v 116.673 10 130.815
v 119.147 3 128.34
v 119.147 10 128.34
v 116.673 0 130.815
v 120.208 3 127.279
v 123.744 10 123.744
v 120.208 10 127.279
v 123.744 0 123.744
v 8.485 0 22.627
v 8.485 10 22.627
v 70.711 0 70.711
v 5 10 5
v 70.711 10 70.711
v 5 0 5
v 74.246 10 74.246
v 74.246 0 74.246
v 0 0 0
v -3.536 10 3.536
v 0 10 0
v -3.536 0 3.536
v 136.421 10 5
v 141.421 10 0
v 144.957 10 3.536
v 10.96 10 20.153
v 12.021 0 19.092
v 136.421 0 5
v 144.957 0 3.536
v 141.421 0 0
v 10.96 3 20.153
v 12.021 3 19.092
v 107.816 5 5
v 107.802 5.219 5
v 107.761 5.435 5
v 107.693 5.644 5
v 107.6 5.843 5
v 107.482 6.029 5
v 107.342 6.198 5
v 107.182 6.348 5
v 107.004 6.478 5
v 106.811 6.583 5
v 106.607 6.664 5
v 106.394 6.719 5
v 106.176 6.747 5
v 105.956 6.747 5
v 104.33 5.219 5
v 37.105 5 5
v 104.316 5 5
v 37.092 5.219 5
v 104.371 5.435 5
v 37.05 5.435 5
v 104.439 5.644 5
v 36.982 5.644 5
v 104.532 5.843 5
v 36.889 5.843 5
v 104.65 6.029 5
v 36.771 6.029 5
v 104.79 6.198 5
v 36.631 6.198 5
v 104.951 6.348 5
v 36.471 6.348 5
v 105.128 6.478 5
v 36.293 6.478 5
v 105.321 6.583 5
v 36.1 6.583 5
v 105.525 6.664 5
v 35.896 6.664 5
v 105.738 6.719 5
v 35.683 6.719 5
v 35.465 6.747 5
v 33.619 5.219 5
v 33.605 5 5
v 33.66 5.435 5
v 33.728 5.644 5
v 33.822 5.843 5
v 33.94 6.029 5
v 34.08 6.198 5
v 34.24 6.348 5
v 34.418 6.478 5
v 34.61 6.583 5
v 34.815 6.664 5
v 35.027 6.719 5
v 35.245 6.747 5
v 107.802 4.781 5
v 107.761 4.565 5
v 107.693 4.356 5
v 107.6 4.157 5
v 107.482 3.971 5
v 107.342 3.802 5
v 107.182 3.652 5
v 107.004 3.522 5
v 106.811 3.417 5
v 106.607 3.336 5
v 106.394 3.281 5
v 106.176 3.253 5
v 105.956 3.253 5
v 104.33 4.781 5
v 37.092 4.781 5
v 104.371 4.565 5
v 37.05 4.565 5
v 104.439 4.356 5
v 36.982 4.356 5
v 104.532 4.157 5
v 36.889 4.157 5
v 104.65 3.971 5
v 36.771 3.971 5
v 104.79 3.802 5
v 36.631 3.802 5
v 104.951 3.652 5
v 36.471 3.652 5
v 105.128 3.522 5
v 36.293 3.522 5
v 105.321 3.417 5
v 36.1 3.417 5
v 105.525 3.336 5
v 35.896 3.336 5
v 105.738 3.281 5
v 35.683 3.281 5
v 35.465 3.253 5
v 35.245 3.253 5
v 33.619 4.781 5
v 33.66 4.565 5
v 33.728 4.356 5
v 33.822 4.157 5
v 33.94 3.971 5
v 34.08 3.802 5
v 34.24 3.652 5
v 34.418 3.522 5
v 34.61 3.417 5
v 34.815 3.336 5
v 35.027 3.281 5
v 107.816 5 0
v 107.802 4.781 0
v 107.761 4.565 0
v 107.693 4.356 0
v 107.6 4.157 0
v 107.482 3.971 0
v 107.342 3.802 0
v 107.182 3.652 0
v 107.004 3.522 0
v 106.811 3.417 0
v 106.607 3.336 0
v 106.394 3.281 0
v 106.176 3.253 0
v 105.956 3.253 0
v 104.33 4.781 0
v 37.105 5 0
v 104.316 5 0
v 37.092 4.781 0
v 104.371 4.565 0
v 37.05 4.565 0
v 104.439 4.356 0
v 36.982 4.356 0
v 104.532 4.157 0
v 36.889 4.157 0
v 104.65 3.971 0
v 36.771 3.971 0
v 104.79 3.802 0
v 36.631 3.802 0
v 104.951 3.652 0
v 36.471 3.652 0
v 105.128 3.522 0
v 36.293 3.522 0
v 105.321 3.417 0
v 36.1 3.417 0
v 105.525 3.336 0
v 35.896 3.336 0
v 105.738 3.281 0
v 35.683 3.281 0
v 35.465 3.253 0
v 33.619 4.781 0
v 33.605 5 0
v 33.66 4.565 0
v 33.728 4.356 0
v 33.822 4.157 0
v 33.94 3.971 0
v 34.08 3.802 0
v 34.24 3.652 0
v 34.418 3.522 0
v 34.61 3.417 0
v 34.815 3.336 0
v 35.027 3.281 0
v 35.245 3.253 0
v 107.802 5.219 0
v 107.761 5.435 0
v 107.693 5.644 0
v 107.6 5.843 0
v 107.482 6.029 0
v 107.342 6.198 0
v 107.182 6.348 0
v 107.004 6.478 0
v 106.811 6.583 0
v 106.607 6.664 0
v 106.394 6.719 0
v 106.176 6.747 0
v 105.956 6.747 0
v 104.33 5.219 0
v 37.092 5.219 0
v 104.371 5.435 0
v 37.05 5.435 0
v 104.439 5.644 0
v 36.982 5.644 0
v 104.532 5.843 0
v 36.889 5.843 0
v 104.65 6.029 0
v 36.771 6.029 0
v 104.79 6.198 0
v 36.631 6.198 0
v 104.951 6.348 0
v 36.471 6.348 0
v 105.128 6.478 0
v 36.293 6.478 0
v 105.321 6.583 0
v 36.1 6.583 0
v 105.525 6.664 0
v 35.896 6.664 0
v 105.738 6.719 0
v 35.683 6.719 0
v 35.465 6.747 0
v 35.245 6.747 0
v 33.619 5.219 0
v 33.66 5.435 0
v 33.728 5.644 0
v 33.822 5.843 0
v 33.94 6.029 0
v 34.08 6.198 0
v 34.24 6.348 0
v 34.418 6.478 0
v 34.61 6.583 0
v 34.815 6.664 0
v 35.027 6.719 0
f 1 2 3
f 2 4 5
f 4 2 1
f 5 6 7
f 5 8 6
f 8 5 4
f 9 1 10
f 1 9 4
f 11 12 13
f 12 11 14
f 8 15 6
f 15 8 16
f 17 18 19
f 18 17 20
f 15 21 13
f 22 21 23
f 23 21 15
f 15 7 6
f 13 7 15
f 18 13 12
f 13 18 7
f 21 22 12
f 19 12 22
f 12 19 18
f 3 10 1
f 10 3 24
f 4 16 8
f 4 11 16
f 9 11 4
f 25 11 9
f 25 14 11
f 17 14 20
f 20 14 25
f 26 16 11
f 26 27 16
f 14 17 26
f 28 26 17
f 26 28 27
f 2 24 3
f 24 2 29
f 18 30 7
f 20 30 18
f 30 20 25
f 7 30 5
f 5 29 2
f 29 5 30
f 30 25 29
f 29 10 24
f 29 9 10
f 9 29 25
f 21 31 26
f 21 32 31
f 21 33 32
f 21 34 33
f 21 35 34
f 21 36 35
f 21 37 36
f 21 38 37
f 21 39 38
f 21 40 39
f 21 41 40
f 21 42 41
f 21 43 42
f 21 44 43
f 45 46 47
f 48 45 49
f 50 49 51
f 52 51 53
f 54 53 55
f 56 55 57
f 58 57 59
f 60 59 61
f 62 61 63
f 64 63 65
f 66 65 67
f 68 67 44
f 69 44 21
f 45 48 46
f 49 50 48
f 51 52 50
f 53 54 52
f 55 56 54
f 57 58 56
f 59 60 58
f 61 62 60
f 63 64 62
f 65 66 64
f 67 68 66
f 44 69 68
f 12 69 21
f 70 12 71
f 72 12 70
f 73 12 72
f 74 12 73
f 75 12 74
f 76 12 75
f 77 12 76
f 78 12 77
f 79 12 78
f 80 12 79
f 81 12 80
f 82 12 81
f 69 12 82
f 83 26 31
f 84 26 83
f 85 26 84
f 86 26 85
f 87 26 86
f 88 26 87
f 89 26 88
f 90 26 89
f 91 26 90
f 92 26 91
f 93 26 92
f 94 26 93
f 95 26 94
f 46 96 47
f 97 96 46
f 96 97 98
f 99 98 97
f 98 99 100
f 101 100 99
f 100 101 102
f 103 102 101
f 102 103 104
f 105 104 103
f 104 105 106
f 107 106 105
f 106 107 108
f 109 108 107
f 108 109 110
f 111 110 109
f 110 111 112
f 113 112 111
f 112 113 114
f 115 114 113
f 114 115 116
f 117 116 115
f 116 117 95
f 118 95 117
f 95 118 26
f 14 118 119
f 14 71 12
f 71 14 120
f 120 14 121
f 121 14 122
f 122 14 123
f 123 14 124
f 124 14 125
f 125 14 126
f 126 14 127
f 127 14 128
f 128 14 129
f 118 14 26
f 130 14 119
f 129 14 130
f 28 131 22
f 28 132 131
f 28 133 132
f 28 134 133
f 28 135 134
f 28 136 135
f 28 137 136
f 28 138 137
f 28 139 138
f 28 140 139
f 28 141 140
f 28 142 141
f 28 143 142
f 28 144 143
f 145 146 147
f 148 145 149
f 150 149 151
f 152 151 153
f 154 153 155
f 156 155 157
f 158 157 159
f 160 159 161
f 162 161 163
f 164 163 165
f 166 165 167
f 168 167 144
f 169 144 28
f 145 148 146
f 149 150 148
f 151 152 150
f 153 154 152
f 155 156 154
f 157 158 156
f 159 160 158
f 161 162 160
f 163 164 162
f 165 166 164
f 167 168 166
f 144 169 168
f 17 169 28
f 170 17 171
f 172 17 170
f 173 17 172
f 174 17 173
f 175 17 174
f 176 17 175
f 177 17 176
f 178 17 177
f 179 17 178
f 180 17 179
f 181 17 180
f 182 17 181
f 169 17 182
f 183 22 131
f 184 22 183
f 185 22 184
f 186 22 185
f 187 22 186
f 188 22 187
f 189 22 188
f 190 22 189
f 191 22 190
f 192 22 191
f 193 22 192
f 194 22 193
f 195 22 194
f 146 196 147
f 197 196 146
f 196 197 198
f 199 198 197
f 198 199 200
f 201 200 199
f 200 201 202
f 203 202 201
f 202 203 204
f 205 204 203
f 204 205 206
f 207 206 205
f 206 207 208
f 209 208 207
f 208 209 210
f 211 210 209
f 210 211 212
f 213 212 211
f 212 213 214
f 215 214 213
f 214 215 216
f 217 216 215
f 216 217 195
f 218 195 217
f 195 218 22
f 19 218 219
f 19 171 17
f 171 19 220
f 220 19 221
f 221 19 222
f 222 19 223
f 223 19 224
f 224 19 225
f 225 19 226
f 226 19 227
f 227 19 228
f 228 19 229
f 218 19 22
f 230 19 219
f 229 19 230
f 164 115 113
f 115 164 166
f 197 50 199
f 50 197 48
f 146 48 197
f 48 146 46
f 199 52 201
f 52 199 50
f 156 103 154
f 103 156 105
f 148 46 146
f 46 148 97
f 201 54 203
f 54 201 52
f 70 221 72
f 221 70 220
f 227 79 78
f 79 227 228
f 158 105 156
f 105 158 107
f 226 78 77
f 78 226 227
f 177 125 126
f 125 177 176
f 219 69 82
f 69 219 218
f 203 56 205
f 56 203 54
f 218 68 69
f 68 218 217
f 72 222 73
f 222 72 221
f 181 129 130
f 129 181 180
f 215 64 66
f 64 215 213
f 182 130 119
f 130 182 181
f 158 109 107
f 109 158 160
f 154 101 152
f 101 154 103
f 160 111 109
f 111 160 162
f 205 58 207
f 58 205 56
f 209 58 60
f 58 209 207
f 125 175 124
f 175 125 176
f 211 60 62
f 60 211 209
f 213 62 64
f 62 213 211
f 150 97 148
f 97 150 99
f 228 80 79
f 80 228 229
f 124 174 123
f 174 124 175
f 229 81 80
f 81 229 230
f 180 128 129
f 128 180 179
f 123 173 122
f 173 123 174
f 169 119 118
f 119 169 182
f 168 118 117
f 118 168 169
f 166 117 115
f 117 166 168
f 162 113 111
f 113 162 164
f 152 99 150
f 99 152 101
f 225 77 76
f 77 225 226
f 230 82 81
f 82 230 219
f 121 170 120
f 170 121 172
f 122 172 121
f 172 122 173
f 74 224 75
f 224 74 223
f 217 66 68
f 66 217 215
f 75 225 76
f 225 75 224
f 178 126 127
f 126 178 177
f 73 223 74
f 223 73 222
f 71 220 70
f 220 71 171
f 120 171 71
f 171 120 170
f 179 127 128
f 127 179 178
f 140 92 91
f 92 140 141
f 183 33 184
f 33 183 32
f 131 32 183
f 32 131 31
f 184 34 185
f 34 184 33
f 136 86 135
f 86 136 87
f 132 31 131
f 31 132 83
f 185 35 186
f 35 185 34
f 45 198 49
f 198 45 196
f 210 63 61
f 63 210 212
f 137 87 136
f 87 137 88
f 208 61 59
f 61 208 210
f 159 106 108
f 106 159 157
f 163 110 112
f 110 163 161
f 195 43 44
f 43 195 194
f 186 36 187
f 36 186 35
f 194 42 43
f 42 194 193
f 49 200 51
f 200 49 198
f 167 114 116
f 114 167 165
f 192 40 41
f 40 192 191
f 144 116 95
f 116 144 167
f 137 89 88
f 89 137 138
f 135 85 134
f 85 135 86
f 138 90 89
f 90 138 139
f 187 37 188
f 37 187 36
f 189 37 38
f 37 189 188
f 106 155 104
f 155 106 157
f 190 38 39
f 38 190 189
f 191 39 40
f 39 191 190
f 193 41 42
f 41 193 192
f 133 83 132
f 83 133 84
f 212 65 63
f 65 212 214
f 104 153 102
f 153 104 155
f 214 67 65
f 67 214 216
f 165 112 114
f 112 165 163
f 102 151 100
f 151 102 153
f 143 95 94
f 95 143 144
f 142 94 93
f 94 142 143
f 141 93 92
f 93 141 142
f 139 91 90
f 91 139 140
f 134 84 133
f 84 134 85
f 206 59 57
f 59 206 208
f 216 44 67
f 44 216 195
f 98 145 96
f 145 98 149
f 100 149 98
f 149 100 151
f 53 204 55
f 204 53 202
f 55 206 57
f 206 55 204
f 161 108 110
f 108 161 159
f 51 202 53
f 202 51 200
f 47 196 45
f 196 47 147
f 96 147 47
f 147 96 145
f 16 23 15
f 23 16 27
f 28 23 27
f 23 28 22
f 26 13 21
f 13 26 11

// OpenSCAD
// Panel length (mm)
length = 155;

// Support bar position (mm)
barPos =100;

// Panel angle (max 55 degrees)
angle = 45;

// Channel witdh
channel = 1.5;

// Screw hole diameter (mm)
diameter = 3.5;

// Mirror model?
mirror = 0;

module solarBracket(){
    if(mirror == 0){
        Bracket();
    } else {
       translate([0,-50,0]){
            mirror([0,1,0])
                    Bracket();
        }
    }
}solarBracket();

module Bracket(){
    a =tan(angle)*barPos;                  // support lenght
    h = sqrt(pow(barPos,2)+pow(a,2));     // Base lenght
    difference(){
        rotate([0,-angle,0]){
            difference(){
                cube([length+20,10,10]);       
                
                translate([0,3,5])
                    cube([length+20,17,channel]);
                
                translate([0,0,5])
                    cube([22,10,10]);
            }
           
            translate([barPos,0,-a])
                cube([5,10,a]);
            
            rotate([0,angle,0]){
                difference(){
                    cube([h,10,5]);
                    
                    spacing = h/4;
                    translate([spacing,5,0])
                         cylinder(h=10, d=diameter,$fn=50);
                    
                    translate([3*spacing,5,0])
                        cylinder(h=10, d=diameter,$fn=50);
                }
            }
        }
        translate([20,20,0])
            cube([20,20,20]);
    }
}
